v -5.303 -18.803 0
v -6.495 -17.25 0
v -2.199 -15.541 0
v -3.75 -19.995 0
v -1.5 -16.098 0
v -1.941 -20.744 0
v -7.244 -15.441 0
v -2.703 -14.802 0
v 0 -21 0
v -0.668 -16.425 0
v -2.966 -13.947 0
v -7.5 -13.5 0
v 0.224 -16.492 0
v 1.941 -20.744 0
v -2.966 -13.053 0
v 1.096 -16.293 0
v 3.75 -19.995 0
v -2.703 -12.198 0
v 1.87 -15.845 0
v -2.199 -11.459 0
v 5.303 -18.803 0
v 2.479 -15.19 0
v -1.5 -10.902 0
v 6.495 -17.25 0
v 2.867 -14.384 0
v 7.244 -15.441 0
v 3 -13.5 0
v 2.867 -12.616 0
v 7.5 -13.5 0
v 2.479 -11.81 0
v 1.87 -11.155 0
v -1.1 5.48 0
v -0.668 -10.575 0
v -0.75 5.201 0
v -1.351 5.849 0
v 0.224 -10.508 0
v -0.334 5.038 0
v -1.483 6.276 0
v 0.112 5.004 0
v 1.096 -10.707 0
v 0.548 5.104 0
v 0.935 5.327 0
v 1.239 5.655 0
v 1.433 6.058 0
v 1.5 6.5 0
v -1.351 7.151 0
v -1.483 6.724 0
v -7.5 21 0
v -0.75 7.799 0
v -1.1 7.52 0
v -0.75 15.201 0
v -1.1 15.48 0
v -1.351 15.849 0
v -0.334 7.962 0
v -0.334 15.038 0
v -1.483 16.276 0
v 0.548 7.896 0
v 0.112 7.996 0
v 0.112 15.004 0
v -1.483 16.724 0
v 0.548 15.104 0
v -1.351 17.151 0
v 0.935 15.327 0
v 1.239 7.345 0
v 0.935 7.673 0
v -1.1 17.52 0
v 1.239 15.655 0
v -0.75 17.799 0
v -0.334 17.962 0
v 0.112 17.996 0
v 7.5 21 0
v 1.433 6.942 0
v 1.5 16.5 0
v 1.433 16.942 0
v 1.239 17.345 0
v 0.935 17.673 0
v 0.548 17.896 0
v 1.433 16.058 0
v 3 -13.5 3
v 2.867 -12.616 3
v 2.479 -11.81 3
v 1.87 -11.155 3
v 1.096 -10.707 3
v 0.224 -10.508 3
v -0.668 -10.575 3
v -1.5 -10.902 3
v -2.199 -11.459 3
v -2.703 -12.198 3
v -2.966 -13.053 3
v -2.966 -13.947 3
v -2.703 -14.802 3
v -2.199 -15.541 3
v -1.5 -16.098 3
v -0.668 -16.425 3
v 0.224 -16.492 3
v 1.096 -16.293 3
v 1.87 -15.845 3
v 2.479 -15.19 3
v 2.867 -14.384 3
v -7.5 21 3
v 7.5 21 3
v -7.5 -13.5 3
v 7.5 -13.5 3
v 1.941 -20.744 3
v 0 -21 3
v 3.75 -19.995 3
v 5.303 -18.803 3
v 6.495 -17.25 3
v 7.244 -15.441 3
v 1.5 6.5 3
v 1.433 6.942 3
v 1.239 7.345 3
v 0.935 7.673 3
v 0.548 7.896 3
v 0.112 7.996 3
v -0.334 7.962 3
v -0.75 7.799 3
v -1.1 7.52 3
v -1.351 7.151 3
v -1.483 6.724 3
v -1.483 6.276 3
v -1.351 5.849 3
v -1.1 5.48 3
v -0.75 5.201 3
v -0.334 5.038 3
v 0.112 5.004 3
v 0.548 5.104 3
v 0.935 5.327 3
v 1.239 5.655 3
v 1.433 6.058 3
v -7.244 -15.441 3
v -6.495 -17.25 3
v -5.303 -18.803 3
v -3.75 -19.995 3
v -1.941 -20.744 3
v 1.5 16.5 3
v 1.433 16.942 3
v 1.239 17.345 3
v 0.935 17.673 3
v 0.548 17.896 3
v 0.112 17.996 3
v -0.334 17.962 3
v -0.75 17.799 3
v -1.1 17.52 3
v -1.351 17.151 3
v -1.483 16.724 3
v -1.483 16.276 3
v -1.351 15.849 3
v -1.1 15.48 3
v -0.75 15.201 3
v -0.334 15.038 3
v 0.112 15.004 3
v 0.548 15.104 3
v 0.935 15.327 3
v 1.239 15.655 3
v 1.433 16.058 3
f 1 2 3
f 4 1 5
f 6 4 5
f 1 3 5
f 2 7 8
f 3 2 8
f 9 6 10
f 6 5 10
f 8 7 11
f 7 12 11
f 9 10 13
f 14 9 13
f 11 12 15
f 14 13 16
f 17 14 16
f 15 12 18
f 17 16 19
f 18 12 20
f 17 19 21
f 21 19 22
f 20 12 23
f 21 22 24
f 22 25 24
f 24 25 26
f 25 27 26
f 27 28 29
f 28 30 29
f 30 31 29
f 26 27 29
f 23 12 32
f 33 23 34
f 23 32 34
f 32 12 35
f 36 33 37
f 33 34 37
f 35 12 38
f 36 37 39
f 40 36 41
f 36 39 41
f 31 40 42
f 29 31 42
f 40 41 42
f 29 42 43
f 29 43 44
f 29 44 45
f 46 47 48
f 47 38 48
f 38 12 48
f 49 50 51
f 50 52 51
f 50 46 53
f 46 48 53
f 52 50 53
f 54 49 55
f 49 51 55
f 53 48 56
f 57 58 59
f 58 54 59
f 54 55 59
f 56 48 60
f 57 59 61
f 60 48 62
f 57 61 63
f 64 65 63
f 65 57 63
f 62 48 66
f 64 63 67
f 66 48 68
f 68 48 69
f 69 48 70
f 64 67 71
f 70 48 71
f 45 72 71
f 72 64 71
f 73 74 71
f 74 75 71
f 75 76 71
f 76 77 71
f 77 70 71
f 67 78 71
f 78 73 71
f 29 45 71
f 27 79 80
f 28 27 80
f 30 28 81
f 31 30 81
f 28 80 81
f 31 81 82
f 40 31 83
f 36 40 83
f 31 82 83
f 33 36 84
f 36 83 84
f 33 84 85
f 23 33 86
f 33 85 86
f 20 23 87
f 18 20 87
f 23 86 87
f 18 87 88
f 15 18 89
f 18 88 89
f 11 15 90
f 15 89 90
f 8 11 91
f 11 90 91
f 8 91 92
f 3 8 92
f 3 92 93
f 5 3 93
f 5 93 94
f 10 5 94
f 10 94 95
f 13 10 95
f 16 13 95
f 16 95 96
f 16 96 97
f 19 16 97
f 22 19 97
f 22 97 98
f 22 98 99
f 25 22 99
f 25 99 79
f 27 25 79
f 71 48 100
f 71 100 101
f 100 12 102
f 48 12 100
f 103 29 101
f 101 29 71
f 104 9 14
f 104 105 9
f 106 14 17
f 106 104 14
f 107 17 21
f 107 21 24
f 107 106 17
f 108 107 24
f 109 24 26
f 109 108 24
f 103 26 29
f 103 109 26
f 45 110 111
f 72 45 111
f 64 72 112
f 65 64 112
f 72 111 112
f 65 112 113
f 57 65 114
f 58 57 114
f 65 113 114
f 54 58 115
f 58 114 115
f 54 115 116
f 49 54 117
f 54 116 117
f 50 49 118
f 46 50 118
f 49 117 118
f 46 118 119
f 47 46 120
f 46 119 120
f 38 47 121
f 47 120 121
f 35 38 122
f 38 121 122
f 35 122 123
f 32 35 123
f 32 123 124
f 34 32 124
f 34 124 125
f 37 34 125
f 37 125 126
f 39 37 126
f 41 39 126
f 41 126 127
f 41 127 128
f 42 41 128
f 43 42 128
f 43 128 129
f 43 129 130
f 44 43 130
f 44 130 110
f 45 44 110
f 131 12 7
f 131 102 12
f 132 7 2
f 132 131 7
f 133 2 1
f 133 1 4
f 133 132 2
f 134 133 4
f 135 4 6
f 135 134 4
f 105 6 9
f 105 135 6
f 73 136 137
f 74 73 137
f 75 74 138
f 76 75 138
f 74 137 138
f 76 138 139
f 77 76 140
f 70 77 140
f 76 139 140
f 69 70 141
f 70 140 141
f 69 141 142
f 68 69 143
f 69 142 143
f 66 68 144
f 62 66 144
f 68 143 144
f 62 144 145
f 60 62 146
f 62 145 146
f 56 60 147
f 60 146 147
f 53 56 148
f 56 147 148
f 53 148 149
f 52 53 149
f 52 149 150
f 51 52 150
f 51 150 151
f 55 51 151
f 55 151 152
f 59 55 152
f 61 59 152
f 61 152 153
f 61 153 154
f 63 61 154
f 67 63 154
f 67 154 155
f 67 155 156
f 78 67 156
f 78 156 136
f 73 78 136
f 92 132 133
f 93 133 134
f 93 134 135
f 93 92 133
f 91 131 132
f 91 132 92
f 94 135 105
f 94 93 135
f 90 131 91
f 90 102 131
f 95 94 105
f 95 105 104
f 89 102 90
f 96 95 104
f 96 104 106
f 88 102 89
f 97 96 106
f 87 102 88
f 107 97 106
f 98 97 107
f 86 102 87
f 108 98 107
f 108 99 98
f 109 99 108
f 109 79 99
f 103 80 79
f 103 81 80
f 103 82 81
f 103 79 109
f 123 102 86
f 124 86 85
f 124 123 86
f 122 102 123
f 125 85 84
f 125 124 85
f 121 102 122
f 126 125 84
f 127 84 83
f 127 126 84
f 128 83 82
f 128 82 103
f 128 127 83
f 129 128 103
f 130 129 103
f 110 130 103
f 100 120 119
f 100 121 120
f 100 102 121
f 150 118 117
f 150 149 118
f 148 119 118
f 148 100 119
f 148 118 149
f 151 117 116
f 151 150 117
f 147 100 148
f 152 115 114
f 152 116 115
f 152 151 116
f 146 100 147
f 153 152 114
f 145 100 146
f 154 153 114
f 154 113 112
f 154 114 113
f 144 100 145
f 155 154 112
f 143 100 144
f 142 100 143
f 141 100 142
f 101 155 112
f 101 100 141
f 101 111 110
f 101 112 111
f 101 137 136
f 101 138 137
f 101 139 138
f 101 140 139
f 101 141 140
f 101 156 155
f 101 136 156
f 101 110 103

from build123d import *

# Parameters (mm, degrees)
SKETCH_1_W          = 15
SKETCH_1_H          = 42
EXTRUDE_1_DEPTH     = 3
SKETCH_3_R          = 1.5
SKETCH_3_R_2        = 3
CUT_EXTRUDE_1_DEPTH = 23.5
FILLET_1_R          = 7.5


with BuildPart() as part:
    # 草图1 → 凸台-拉伸1 (new body)
    with BuildSketch(Plane.XY):
        Rectangle(SKETCH_1_W, SKETCH_1_H)
    extrude(amount=EXTRUDE_1_DEPTH)

    # 草图3 → 切除-拉伸1 (cut, through all)
    with BuildSketch(Plane.XY.offset(3)):
        with Locations((0, 16.5)):
            Circle(SKETCH_3_R)
        with Locations((0, 6.5)):
            Circle(SKETCH_3_R)
        with Locations((0, -13.5)):
            Circle(SKETCH_3_R_2)
    extrude(amount=-CUT_EXTRUDE_1_DEPTH, mode=Mode.SUBTRACT)

    # 圆角1
    fillet_1_edges = [part.edges().sort_by_distance(p)[0] for p in [
        (-7.5, -21, 1.5),
        (7.5, -21, 1.5),
    ]]
    fillet(fillet_1_edges, radius=FILLET_1_R - 0.0001)  # a hair under: the kernel refuses the full size


solid = part.part
